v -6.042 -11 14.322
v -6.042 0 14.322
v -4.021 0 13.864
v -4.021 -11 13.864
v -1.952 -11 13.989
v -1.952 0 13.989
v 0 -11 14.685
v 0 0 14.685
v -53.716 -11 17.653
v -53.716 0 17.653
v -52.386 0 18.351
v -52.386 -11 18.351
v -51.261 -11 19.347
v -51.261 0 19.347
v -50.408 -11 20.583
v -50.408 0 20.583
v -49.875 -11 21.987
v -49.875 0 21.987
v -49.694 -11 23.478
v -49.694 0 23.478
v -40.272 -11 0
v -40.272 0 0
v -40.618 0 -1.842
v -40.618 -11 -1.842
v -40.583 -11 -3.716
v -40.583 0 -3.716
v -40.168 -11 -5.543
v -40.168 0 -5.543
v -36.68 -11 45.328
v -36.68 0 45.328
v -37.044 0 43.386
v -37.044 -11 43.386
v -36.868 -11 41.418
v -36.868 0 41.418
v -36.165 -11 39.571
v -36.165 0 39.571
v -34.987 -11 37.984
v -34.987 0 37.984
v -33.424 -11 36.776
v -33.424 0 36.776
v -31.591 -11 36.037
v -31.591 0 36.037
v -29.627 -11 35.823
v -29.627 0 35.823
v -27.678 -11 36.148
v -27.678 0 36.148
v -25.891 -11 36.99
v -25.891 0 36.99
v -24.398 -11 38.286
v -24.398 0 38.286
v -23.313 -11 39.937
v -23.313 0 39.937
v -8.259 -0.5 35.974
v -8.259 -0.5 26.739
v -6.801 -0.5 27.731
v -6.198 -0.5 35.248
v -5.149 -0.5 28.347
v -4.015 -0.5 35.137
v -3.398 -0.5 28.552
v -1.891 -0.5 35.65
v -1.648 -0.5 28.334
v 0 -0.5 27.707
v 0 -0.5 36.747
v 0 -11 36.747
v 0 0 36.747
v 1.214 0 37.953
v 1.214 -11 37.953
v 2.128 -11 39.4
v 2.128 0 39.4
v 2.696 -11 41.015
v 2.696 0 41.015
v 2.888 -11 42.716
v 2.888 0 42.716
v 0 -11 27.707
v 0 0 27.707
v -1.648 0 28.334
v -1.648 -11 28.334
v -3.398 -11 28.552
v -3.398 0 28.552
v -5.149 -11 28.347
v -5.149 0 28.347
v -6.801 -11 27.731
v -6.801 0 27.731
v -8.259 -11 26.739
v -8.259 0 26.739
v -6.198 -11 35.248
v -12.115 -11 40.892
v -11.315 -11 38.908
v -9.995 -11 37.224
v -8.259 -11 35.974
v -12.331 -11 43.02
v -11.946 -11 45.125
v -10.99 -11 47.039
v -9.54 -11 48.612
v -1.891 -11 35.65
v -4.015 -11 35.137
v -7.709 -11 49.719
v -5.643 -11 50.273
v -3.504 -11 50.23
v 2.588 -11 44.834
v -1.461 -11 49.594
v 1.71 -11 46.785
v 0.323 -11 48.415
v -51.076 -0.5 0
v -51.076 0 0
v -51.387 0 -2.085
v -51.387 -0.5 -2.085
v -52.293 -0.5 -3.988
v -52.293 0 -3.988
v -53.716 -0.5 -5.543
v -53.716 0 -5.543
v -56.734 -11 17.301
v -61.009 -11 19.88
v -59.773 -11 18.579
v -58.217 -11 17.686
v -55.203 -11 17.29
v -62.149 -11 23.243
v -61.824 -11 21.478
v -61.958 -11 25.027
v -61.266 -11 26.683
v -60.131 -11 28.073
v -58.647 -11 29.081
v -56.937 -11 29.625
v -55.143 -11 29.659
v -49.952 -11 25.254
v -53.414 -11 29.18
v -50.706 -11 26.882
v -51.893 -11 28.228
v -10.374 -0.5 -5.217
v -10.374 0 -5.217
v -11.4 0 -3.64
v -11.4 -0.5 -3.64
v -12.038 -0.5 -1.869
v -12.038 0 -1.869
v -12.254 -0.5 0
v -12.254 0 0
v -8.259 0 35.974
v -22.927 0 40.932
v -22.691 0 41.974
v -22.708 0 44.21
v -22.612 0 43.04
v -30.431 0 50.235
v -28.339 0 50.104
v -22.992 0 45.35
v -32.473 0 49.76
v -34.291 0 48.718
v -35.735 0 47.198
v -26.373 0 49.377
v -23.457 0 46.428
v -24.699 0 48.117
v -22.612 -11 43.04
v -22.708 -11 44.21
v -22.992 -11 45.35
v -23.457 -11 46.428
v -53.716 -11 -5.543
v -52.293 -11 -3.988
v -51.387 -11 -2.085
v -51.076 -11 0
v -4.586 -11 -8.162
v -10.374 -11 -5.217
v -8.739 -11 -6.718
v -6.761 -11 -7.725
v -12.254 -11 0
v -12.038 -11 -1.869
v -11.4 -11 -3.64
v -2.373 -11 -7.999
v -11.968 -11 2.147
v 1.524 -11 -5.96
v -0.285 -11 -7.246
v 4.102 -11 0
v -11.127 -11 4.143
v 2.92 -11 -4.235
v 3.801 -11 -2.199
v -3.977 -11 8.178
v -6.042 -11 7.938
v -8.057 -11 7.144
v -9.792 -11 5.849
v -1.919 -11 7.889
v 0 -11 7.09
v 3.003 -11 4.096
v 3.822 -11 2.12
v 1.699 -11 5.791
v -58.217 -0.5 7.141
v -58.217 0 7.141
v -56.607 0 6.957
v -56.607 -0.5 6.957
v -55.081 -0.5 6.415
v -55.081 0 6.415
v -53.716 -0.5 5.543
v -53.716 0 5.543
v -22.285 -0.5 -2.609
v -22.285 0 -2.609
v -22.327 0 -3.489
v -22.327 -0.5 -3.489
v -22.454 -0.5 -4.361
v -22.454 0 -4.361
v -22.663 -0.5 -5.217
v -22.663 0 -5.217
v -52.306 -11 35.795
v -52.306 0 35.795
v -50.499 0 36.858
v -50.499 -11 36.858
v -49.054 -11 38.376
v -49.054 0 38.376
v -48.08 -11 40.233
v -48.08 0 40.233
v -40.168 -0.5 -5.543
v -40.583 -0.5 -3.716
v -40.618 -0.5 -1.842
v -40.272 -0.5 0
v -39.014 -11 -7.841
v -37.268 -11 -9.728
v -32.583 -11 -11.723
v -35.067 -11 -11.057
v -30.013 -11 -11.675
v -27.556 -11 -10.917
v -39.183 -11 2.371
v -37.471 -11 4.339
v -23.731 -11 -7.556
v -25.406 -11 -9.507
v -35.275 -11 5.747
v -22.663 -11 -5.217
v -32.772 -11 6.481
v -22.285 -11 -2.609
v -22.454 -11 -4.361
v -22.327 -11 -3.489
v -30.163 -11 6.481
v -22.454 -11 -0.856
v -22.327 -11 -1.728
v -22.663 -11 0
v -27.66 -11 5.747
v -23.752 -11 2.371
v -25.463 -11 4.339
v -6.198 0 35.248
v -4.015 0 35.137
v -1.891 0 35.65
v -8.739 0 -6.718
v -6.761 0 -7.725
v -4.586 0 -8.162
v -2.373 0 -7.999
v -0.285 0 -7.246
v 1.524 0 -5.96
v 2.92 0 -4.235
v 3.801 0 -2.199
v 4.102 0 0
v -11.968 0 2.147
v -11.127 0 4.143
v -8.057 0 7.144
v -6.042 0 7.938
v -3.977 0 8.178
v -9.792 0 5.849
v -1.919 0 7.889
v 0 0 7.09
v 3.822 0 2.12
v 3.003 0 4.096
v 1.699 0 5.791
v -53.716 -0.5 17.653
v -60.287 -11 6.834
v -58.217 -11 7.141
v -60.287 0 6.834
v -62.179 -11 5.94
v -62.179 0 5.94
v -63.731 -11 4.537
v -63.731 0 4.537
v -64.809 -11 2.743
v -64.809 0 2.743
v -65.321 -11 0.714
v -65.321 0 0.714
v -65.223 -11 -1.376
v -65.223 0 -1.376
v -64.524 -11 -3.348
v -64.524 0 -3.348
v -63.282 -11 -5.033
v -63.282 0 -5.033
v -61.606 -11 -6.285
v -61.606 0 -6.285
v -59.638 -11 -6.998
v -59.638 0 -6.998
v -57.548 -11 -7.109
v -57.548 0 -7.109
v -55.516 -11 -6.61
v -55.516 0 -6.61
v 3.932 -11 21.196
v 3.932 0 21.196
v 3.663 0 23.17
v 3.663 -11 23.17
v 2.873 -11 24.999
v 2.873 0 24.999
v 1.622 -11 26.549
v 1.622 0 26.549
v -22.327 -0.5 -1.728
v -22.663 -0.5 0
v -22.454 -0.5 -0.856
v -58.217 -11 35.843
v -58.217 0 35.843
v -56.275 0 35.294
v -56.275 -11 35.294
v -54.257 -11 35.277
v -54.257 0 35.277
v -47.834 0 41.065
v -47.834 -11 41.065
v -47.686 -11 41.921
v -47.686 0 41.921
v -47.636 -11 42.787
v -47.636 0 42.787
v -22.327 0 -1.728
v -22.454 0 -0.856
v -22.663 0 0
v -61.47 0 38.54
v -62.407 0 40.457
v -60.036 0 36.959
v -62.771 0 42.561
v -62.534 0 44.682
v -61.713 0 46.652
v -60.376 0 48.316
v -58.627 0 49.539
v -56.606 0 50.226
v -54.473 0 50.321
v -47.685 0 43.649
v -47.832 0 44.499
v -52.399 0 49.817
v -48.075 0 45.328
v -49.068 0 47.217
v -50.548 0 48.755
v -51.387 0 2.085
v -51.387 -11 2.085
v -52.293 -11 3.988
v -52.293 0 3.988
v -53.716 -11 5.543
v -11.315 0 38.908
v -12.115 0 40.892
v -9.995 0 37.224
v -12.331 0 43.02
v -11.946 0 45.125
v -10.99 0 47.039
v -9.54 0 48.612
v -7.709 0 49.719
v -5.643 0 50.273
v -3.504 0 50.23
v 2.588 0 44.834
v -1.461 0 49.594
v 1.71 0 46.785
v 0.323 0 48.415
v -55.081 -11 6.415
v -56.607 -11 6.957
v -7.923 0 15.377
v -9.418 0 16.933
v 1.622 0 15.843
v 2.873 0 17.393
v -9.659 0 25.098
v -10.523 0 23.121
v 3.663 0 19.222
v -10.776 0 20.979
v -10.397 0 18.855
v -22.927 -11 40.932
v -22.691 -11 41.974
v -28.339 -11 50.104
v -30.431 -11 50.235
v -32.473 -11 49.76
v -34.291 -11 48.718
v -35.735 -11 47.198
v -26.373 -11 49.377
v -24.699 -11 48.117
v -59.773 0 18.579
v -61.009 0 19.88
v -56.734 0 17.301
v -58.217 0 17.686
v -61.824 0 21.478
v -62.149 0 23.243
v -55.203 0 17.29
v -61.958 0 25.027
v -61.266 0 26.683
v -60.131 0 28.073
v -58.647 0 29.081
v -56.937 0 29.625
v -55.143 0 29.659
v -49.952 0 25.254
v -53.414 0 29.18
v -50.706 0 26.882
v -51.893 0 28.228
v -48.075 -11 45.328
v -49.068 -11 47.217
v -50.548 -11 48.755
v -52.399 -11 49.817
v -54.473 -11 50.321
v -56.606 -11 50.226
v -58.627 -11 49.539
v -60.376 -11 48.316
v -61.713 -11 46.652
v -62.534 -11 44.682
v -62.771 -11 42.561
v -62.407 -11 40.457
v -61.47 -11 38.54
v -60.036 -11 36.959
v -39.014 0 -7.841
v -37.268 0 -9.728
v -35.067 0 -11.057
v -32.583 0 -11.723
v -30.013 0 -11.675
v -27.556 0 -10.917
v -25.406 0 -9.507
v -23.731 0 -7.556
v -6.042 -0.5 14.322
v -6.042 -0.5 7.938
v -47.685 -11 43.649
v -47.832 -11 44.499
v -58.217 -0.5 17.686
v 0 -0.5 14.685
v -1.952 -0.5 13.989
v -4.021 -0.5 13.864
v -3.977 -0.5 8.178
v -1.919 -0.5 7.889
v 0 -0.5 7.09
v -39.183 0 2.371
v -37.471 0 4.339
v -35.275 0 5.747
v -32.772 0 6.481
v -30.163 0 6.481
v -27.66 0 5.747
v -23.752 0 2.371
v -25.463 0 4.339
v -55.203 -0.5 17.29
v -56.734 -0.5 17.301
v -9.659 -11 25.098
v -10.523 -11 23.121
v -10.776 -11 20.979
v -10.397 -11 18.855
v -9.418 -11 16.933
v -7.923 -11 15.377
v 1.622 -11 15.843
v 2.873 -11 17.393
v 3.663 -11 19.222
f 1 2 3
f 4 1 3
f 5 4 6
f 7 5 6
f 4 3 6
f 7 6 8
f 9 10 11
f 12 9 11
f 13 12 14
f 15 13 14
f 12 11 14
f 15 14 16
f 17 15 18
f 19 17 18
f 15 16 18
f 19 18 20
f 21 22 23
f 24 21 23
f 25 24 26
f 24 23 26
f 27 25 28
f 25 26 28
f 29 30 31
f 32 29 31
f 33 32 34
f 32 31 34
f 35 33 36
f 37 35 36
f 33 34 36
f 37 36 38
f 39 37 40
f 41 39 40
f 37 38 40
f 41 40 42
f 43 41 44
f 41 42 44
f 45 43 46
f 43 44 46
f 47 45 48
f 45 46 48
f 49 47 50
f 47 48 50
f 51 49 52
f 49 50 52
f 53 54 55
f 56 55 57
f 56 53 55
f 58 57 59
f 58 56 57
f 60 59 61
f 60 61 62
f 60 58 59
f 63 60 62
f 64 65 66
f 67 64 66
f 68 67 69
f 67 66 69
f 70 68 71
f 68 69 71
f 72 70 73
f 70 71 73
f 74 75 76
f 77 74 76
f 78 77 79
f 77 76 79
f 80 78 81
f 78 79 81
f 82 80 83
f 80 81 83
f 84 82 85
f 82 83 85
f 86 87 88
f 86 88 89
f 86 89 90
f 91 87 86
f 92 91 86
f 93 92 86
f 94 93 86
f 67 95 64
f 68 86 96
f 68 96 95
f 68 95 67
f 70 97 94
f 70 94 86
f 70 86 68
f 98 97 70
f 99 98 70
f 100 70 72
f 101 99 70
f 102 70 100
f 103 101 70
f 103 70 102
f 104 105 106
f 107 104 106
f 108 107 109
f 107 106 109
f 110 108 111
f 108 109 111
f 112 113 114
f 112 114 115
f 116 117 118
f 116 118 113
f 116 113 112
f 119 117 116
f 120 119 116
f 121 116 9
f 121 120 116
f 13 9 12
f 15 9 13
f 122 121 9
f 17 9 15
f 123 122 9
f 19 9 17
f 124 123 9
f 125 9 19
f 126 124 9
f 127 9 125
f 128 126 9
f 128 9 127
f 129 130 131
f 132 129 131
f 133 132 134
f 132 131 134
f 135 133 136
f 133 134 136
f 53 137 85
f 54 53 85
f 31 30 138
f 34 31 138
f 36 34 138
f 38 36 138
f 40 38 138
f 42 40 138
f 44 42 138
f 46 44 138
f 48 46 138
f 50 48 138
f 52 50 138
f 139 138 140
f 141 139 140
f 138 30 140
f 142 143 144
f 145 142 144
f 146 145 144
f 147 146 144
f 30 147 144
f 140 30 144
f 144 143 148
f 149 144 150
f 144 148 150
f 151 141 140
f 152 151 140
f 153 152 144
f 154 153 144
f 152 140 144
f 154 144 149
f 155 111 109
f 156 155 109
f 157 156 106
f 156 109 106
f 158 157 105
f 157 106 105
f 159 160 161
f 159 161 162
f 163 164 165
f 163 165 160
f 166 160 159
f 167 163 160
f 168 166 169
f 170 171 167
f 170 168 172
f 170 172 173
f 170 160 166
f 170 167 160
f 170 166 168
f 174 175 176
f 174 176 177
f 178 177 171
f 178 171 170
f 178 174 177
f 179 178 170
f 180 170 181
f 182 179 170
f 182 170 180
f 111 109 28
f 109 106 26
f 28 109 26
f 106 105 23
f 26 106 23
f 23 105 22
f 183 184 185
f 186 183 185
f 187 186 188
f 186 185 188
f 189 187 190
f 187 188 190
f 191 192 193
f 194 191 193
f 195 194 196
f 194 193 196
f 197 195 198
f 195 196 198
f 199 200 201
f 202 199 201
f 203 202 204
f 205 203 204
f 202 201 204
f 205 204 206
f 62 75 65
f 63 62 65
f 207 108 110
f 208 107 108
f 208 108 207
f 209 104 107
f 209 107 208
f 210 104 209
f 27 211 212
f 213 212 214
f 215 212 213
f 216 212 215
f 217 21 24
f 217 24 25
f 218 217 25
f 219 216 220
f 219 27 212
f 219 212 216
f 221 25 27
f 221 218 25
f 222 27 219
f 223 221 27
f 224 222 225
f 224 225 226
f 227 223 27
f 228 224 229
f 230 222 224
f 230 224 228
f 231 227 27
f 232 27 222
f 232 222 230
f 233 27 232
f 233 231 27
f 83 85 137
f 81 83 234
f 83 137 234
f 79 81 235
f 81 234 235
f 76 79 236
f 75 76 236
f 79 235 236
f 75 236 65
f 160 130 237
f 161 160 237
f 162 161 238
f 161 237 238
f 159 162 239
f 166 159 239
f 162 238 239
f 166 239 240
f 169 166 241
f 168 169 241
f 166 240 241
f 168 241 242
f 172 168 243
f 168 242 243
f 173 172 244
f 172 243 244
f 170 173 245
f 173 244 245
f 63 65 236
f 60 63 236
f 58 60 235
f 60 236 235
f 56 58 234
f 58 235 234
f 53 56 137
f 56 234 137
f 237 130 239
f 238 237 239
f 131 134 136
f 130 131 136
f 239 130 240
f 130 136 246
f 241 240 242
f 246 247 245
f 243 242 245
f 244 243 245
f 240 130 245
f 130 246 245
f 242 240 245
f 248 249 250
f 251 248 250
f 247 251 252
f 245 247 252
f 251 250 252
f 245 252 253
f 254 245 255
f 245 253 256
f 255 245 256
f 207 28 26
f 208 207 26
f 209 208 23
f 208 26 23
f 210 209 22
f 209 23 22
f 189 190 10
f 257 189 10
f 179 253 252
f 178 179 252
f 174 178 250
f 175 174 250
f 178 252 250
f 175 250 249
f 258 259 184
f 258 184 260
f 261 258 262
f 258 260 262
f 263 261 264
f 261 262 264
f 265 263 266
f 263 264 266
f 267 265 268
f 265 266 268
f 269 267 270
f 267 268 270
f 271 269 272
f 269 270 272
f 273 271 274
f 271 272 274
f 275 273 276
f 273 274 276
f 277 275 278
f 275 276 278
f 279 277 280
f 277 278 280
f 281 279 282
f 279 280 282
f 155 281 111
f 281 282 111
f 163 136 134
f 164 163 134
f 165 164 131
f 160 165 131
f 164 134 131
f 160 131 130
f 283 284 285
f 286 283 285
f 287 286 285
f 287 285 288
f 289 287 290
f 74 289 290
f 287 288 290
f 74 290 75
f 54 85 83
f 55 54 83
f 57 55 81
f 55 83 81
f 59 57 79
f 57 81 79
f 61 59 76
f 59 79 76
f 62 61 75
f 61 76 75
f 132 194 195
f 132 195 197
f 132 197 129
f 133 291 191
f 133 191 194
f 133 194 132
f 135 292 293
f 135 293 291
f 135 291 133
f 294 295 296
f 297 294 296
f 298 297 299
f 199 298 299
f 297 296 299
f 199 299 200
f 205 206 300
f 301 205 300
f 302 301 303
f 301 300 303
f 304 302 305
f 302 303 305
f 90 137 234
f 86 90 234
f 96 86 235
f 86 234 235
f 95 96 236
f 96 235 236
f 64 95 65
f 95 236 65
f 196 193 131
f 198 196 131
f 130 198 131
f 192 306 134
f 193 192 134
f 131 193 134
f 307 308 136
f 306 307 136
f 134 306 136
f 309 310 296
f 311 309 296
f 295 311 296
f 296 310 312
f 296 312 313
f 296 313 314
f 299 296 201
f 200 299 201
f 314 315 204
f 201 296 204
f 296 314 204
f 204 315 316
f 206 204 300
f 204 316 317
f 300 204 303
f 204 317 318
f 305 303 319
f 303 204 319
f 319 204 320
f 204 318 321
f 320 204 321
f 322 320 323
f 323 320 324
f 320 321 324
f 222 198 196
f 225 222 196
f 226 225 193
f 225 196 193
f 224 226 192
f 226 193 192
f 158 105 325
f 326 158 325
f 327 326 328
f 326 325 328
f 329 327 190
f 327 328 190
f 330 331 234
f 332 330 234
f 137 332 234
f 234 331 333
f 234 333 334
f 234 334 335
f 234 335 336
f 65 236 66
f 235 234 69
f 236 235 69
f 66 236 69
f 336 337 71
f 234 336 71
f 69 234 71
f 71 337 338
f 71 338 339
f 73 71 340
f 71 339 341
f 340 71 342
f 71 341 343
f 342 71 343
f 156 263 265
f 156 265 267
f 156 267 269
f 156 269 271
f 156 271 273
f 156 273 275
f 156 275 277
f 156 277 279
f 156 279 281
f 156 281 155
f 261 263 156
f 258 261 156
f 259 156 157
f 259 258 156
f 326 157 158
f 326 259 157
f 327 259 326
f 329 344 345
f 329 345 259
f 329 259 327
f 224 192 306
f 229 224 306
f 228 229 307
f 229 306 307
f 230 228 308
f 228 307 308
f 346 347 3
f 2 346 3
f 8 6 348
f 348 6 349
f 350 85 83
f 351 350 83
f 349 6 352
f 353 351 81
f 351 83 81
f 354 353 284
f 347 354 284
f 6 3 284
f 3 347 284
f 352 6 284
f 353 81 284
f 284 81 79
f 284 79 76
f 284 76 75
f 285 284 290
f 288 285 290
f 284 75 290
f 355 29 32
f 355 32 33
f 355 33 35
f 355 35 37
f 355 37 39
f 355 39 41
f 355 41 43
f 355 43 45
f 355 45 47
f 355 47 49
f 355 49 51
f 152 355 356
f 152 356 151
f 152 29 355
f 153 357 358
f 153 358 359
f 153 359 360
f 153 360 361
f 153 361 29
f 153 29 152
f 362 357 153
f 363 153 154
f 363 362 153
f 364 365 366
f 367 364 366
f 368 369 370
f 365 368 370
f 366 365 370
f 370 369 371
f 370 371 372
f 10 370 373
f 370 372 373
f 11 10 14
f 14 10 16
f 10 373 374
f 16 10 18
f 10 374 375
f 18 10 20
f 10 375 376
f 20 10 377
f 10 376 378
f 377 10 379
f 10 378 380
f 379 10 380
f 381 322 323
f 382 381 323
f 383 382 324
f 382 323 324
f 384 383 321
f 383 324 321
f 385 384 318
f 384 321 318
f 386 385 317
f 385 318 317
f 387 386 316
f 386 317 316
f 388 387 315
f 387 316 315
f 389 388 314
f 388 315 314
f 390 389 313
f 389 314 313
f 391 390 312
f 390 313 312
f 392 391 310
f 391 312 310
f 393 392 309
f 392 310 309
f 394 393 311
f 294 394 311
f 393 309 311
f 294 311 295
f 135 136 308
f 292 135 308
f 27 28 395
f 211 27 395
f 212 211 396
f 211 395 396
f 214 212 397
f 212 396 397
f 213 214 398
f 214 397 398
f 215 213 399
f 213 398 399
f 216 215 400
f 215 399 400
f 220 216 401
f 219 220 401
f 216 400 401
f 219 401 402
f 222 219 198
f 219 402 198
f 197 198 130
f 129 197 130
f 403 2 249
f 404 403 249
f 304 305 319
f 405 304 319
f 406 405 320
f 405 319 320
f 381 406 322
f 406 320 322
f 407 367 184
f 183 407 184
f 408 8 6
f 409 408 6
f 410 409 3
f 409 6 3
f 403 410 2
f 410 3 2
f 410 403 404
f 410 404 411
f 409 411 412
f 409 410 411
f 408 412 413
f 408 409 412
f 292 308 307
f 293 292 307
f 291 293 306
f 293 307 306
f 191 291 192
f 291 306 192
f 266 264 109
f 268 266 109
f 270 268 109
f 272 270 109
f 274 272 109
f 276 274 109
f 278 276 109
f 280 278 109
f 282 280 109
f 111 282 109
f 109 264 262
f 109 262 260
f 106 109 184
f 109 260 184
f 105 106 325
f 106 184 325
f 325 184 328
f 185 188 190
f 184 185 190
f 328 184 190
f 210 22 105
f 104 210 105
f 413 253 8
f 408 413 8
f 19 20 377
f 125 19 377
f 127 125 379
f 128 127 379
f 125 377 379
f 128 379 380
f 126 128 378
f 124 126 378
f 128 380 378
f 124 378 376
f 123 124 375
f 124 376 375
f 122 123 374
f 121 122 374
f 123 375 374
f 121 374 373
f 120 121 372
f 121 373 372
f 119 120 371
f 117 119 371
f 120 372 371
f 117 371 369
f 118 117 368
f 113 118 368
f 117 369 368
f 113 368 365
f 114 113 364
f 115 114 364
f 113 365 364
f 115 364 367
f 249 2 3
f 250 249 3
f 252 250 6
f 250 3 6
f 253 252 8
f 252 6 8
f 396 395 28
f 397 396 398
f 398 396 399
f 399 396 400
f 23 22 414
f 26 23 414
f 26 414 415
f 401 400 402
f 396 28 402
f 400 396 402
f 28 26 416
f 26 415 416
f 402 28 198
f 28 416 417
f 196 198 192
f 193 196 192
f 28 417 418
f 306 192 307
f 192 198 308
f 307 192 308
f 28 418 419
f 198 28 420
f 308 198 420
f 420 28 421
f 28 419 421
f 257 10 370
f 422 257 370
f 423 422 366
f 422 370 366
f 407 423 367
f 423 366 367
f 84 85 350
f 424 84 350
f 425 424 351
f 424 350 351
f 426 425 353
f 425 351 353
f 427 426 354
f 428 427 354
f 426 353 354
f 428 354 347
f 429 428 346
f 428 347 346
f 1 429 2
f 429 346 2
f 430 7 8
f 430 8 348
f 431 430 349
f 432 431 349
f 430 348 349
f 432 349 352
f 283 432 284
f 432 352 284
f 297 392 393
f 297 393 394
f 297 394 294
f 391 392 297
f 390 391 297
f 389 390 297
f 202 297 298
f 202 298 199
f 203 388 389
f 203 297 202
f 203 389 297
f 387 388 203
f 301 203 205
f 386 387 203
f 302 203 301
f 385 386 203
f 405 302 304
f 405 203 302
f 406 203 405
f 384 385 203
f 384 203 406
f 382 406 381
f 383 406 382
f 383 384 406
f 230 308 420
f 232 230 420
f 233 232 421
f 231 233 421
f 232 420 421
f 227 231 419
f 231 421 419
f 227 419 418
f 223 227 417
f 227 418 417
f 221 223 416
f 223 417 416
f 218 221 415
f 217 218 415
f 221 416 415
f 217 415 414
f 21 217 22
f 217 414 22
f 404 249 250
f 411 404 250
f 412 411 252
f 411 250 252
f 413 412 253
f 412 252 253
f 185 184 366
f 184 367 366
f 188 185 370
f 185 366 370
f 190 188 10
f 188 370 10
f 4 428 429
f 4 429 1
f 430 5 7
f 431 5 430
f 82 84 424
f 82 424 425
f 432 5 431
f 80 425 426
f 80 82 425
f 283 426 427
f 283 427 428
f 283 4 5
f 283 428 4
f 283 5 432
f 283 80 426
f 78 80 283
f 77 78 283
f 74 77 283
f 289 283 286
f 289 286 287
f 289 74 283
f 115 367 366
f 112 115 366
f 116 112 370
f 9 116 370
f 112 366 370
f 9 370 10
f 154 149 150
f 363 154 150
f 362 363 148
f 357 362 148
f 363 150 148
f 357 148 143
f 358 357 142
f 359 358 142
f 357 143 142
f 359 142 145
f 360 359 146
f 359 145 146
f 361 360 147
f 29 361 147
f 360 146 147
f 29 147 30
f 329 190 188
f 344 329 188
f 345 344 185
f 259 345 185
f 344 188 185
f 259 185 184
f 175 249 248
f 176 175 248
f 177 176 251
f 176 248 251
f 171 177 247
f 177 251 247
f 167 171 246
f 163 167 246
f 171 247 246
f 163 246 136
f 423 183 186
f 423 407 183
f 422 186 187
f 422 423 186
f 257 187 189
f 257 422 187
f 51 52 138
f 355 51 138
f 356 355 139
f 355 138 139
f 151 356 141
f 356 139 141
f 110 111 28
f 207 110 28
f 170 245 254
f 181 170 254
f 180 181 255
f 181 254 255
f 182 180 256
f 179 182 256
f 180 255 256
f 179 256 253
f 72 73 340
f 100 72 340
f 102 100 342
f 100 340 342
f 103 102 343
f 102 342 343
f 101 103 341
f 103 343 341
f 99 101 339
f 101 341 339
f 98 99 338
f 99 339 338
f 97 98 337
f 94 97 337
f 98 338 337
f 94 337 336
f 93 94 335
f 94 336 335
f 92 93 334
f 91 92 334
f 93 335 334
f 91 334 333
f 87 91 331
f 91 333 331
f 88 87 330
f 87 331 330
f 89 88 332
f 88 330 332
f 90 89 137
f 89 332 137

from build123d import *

# Parameters (mm, degrees)
F1_DEPTH = 11
F2_DEPTH = 11
F3_DEPTH = 0.5


# Not quite as in the source:
# - the program builds the solid bodies; features that only make, move or delete a surface that nothing else refers to are left out


with BuildPart() as f1:
    # F0 (on Front) → F1 (new body)
    with BuildSketch(Plane.XZ):
        with BuildLine():
            ThreePointArc((-48.0797858384, 40.2328155244), (-47.7475992787, 41.4908425789), (-47.6357689738, 42.7871735409))
            ThreePointArc((-47.6357689738, 42.7871735409), (-47.7463471065, 44.0762802216), (-48.0748507334, 45.3277229588))
            ThreePointArc((-48.0748507334, 45.3277229588), (-60.375625727, 48.3155165258), (-58.2165755639, 35.8425666648))
            ThreePointArc((-58.2165755639, 35.8425666648), (-55.2660968969, 35.2180036102), (-52.3059486726, 35.7950008925))
            ThreePointArc((-52.3059486726, 35.7950008925), (-49.723681576, 37.5670993069), (-48.0797858384, 40.2328155244))
        make_face()
    extrude(amount=F1_DEPTH)


with BuildPart() as f2:
    # F0 (on Front) → F2 (new body)
    with BuildSketch(Plane.XZ):
        with BuildLine():
            ThreePointArc((-23.456767508, 46.4283592716), (-30.4311757631, 50.2349900835), (-36.6802987427, 45.3277229588))
            ThreePointArc((-36.6802987427, 45.3277229588), (-32.5328439874, 36.3437266645), (-23.3130527419, 39.9366390976))
            ThreePointArc((-23.3130527419, 39.9366390976), (-22.7895849326, 41.4491210345), (-22.612189983, 43.0397659315))
            ThreePointArc((-22.612189983, 43.0397659315), (-22.8265154402, 44.7858956532), (-23.456767508, 46.4283592716))
        make_face()
    extrude(amount=F2_DEPTH)


with BuildPart() as f2b:
    # F0 (on Front) → F2, piece 2 (new body)
    with BuildSketch(Plane.XZ):
        with BuildLine():
            ThreePointArc((0, 36.7466998694), (2.1283855445, 39.4003538773), (2.8884372282, 42.7161080988))
            ThreePointArc((2.8884372282, 42.7161080988), (-8.6637290747, 49.2300143883), (-8.2591603931, 35.9740781474))
            ThreePointArc((-8.2591603931, 35.9740781474), (-4.0151002339, 35.1366227762), (0, 36.7466998694))
        make_face()
    extrude(amount=F2_DEPTH)


with BuildPart() as f2c:
    # F0 (on Front) → F2, piece 3 (new body)
    with BuildSketch(Plane.XZ):
        with BuildLine():
            ThreePointArc((0, 27.7067552004), (-4.2794308504, 28.5019946278), (-8.2591603931, 26.7391313554))
            ThreePointArc((-8.2591603931, 26.7391313554), (-10.6648668946, 19.9029390291), (-6.0418137213, 14.3218702558))
            ThreePointArc((-6.0418137213, 14.3218702558), (-2.9817939053, 13.8533705398), (0, 14.6853070545))
            ThreePointArc((0, 14.6853070545), (2.8730515364, 17.3929499669), (3.9324518182, 21.1960311275))
            ThreePointArc((3.9324518182, 21.1960311275), (2.8730515364, 24.9991122881), (0, 27.7067552004))
        make_face()
    extrude(amount=F2_DEPTH)


with BuildPart() as f2d:
    # F0 (on Front) → F2, piece 4 (new body)
    with BuildSketch(Plane.XZ):
        with BuildLine():
            ThreePointArc((0, 7.0900501454), (-2.9388285364, 8.0987617403), (-6.0418137213, 7.9384645471))
            ThreePointArc((-6.0418137213, 7.9384645471), (-10.5165626716, 5.0401961715), (-12.2543084234, 0))
            ThreePointArc((-12.2543084234, 0), (-11.7698509636, -2.7729589527), (-10.3738746923, -5.2173915319))
            ThreePointArc((-10.3738746923, -5.2173915319), (-1.303128429, -7.6937635819), (4.10213366, 0))
            ThreePointArc((4.10213366, 0), (3.0026993435, 4.0956169141), (0, 7.0900501454))
        make_face()
    extrude(amount=F2_DEPTH)


with BuildPart() as f2e:
    # F0 (on Front) → F2, piece 5 (new body)
    with BuildSketch(Plane.XZ):
        with BuildLine():
            ThreePointArc((-22.2847013796, -2.608695766), (-22.3797796773, -1.2907012663), (-22.6630456746, 0))
            ThreePointArc((-22.6630456746, 0), (-31.4673930407, 6.5739958951), (-40.2717404068, 0))
            ThreePointArc((-40.2717404068, 0), (-40.6484919474, -2.7797191761), (-40.1684777533, -5.5434787162))
            ThreePointArc((-40.1684777533, -5.5434787162), (-31.2963696305, -11.7897946727), (-22.6630456746, -5.2173915319))
            ThreePointArc((-22.6630456746, -5.2173915319), (-22.3797796773, -3.9266902656), (-22.2847013796, -2.608695766))
        make_face()
    extrude(amount=F2_DEPTH)


with BuildPart() as f2f:
    # F0 (on Front) → F2, piece 6 (new body)
    with BuildSketch(Plane.XZ):
        with BuildLine():
            ThreePointArc((-53.7156391117, -5.5434787162), (-51.7695567399, -3.0699403099), (-51.0759463743, 0))
            ThreePointArc((-51.0759463743, 0), (-51.7695567399, 3.0699403099), (-53.7156391117, 5.5434787162))
            ThreePointArc((-53.7156391117, 5.5434787162), (-55.8286204459, 6.7295063399), (-58.2165755639, 7.1406291896))
            ThreePointArc((-58.2165755639, 7.1406291896), (-64.9460819038, -2.387955118), (-53.7156391117, -5.5434787162))
        make_face()
    extrude(amount=F2_DEPTH)


with BuildPart() as f2g:
    # F0 (on Front) → F2, piece 7 (new body)
    with BuildSketch(Plane.XZ):
        with BuildLine():
            ThreePointArc((-58.2165755639, 17.6855820413), (-55.9691628256, 17.2485445266), (-53.7156391117, 17.6528917491))
            ThreePointArc((-53.7156391117, 17.6528917491), (-50.7970881723, 19.9389032943), (-49.6940344894, 23.4782621264))
            ThreePointArc((-49.6940344894, 23.4782621264), (-59.4259467219, 28.6306608138), (-58.2165755639, 17.6855820413))
        make_face()
    extrude(amount=F2_DEPTH)


with BuildPart() as f3:
    # F0 (on Front) → F3 (new body)
    with BuildSketch(Plane.XZ):
        with BuildLine():
            ThreePointArc((-40.1684777533, -5.5434787162), (-40.6484919474, -2.7797191761), (-40.2717404068, 0))
            Line((-40.2717404068, 0), (-51.0759463743, 0))
            ThreePointArc((-51.0759463743, 0), (-51.7695567399, -3.0699403099), (-53.7156391117, -5.5434787162))
            Line((-53.7156391117, -5.5434787162), (-40.1684777533, -5.5434787162))
        make_face()
    extrude(amount=F3_DEPTH)


with BuildPart() as f3b:
    # F0 (on Front) → F3, piece 2 (new body)
    with BuildSketch(Plane.XZ):
        with BuildLine():
            ThreePointArc((-10.3738746923, -5.2173915319), (-11.7698509636, -2.7729589527), (-12.2543084234, 0))
            Line((-12.2543084234, 0), (-22.6630456746, 0))
            ThreePointArc((-22.6630456746, 0), (-22.3797796773, -1.2907012663), (-22.2847013796, -2.608695766))
            ThreePointArc((-22.2847013796, -2.608695766), (-22.3797796773, -3.9266902656), (-22.6630456746, -5.2173915319))
            Line((-22.6630456746, -5.2173915319), (-10.3738746923, -5.2173915319))
        make_face()
    extrude(amount=F3_DEPTH)


with BuildPart() as f3c:
    # F0 (on Front) → F3, piece 3 (new body)
    with BuildSketch(Plane.XZ):
        with BuildLine():
            ThreePointArc((0, 14.6853070545), (-2.9817939053, 13.8533705398), (-6.0418137213, 14.3218702558))
            Line((-6.0418137213, 14.3218702558), (-6.0418137213, 7.9384645471))
            ThreePointArc((-6.0418137213, 7.9384645471), (-2.9388285364, 8.0987617403), (0, 7.0900501454))
            Line((0, 7.0900501454), (0, 14.6853070545))
        make_face()
    extrude(amount=F3_DEPTH)


with BuildPart() as f3d:
    # F0 (on Front) → F3, piece 4 (new body)
    with BuildSketch(Plane.XZ):
        with BuildLine():
            ThreePointArc((0, 36.7466998694), (-4.0151002339, 35.1366227762), (-8.2591603931, 35.9740781474))
            Line((-8.2591603931, 35.9740781474), (-8.2591603931, 26.7391313554))
            ThreePointArc((-8.2591603931, 26.7391313554), (-4.2794308504, 28.5019946278), (0, 27.7067552004))
            Line((0, 27.7067552004), (0, 36.7466998694))
        make_face()
    extrude(amount=F3_DEPTH)


with BuildPart() as f3e:
    # F0 (on Front) → F3, piece 5 (new body)
    with BuildSketch(Plane.XZ):
        with BuildLine():
            ThreePointArc((-58.2165755639, 7.1406291896), (-55.8286204459, 6.7295063399), (-53.7156391117, 5.5434787162))
            Line((-53.7156391117, 5.5434787162), (-53.7156391117, 17.6528917491))
            ThreePointArc((-53.7156391117, 17.6528917491), (-55.9691628256, 17.2485445266), (-58.2165755639, 17.6855820413))
            Line((-58.2165755639, 17.6855820413), (-58.2165755639, 7.1406291896))
        make_face()
    extrude(amount=F3_DEPTH)


solid = Compound([f1.part, f2.part, f2b.part, f2c.part, f2d.part, f2e.part, f2f.part, f2g.part, f3.part, f3b.part, f3c.part, f3d.part, f3e.part])
